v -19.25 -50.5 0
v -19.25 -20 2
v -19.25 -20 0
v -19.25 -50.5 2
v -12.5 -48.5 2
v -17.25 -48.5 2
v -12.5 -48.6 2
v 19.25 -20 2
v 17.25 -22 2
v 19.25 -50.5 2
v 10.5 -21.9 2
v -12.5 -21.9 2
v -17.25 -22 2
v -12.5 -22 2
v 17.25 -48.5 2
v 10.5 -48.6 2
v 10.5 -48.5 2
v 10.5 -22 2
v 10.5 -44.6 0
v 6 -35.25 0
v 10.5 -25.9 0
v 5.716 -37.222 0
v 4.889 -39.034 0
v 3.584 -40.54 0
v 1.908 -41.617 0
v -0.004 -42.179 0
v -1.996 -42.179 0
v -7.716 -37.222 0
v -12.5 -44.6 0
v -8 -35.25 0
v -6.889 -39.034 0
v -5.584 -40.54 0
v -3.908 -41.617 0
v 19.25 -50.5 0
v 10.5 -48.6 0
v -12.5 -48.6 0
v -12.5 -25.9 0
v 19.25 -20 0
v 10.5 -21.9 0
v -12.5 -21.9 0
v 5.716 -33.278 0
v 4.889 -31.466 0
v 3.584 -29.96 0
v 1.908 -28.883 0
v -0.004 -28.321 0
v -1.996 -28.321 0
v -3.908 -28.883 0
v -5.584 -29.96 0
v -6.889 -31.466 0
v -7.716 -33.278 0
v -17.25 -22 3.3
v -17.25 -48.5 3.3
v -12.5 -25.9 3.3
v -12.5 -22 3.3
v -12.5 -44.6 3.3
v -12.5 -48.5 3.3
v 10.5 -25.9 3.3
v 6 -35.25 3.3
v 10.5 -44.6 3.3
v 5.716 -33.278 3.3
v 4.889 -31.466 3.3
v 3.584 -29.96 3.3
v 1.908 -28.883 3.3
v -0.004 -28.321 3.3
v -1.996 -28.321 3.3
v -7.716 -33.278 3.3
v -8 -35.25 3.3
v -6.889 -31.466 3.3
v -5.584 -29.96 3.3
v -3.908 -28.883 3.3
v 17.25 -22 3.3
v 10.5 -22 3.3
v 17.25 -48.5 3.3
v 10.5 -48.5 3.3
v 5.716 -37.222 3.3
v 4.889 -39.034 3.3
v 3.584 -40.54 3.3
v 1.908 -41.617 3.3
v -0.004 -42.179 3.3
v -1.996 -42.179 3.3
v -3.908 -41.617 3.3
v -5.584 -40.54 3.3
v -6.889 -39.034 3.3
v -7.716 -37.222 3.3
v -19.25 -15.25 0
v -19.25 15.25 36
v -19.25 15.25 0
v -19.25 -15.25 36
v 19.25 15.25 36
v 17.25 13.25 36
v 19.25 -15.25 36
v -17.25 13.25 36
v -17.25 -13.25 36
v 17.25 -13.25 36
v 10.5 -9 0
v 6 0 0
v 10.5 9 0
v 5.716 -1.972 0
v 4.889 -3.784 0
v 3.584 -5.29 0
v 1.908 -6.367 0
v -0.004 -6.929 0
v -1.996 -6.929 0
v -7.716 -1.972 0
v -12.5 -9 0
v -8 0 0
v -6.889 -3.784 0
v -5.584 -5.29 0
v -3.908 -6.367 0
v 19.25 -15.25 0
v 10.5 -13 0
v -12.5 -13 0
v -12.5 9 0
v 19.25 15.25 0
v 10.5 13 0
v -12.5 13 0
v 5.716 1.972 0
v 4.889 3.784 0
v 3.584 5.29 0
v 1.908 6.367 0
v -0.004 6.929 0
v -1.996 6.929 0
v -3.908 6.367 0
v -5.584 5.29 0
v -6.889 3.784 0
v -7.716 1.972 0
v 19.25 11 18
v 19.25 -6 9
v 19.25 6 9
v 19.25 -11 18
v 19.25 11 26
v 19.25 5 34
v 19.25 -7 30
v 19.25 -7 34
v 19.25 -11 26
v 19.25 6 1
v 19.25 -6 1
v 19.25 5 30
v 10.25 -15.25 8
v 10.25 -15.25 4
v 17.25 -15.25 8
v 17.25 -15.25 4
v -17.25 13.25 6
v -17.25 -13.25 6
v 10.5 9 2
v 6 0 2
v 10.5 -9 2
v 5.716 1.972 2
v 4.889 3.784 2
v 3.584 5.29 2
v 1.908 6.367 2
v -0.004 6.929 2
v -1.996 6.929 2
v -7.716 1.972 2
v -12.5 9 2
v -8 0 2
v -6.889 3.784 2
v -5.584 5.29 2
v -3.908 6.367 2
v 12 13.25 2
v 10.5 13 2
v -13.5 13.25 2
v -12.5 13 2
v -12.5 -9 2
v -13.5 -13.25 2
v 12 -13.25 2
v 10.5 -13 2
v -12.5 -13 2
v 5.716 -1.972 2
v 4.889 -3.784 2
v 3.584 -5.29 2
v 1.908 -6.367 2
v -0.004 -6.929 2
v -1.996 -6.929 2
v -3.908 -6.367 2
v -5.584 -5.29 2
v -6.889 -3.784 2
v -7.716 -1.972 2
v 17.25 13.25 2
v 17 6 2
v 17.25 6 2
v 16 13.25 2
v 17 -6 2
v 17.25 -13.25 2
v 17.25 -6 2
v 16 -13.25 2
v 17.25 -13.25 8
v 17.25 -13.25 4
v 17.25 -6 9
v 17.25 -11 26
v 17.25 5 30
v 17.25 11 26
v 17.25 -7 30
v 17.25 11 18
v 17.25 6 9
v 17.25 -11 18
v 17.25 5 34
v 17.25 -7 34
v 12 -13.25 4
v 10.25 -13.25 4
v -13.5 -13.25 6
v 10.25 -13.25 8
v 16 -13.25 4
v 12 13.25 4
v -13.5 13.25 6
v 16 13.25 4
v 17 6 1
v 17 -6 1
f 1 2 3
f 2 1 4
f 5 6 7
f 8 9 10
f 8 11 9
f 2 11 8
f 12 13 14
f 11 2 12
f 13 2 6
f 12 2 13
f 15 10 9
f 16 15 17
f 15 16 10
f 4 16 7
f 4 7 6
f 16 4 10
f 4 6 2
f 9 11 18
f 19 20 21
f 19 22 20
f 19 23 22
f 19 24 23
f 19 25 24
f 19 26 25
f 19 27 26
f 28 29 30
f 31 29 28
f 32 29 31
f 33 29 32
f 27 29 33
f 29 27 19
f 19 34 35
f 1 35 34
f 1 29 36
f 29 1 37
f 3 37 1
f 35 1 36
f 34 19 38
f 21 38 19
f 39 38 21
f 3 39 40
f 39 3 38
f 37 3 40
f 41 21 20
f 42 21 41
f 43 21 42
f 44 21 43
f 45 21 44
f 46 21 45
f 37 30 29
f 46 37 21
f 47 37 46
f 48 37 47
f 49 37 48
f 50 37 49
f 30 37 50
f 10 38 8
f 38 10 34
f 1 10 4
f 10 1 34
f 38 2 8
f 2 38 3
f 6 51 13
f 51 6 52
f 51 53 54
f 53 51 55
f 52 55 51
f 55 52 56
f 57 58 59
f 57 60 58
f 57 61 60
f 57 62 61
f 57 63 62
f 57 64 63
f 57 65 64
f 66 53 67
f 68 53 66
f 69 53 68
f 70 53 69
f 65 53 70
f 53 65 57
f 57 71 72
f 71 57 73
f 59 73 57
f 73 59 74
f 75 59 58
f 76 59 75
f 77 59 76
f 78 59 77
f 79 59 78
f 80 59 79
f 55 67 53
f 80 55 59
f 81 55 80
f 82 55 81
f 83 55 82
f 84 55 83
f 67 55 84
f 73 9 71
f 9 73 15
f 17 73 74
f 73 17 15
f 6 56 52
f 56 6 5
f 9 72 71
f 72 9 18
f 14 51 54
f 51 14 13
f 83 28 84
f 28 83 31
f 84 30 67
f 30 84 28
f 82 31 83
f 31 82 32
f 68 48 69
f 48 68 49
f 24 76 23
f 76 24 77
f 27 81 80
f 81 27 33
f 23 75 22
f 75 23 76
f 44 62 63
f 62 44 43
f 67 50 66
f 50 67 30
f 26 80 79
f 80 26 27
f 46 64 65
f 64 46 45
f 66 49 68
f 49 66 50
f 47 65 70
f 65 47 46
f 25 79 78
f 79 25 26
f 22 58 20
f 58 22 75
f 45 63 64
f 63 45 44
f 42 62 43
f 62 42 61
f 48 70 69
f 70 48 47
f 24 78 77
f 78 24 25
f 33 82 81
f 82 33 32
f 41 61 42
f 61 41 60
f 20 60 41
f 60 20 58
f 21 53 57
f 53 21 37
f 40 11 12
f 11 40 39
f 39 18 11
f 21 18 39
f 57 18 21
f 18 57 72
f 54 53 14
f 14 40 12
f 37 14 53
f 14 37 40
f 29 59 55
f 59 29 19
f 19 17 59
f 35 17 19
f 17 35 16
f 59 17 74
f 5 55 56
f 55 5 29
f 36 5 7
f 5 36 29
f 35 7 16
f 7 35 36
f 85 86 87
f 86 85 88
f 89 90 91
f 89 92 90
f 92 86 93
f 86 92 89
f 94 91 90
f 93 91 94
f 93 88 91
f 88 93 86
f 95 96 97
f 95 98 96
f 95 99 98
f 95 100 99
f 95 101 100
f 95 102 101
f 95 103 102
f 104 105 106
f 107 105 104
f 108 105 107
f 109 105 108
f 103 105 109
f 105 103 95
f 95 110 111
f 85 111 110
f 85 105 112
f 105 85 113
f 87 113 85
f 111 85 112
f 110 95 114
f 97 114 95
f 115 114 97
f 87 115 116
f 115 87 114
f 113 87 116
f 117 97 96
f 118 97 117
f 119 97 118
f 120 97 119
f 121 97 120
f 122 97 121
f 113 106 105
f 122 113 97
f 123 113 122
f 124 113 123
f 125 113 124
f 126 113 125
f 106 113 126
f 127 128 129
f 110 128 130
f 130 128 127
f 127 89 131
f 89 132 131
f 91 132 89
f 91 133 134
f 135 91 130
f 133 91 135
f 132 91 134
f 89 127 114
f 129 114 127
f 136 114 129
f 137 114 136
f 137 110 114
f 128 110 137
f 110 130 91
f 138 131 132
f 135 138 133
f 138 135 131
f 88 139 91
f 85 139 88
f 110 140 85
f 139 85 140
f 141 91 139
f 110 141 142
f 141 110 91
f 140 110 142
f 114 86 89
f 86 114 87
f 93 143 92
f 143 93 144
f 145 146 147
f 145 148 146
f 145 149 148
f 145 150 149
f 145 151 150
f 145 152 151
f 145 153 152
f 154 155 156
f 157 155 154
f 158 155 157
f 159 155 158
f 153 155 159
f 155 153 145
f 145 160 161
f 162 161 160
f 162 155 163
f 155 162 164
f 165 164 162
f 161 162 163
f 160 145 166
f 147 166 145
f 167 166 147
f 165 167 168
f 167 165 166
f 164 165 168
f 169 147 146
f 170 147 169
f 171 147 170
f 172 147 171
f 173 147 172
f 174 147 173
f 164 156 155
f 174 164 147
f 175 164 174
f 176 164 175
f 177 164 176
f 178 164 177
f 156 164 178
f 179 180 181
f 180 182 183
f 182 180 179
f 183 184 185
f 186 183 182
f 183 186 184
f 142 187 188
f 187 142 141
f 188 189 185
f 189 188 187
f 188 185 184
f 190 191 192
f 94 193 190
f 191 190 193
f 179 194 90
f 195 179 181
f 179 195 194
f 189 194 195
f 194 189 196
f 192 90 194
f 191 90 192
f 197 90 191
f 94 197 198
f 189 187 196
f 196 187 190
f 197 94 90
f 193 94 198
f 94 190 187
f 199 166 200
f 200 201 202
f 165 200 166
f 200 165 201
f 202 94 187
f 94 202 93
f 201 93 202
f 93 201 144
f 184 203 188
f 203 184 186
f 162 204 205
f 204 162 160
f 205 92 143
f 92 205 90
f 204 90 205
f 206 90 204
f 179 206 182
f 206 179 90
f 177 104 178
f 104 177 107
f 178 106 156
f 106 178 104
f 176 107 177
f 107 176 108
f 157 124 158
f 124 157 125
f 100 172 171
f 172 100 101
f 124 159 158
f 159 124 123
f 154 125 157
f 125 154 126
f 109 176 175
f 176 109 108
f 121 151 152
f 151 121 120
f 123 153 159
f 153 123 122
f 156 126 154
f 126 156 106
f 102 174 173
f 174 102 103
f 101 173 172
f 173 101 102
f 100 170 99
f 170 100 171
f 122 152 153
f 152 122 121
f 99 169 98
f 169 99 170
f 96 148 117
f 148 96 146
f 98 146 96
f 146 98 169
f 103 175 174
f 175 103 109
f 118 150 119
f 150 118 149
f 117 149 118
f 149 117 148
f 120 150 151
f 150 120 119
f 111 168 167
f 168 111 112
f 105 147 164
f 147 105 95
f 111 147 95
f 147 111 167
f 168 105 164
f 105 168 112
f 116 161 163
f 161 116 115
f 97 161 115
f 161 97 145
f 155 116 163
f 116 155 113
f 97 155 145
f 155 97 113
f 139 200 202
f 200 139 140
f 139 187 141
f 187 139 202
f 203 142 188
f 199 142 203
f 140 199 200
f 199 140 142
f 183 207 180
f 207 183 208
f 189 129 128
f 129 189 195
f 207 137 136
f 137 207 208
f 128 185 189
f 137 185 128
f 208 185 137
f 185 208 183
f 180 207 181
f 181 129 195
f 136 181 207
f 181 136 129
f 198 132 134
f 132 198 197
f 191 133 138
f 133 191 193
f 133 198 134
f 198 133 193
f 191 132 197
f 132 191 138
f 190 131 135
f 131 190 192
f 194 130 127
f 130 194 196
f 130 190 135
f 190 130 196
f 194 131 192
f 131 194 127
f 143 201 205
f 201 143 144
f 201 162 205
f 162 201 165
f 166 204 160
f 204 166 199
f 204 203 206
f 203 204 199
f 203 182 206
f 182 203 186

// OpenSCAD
//
// WeMOS D1 Mini Stack Enclosure Script
//
// I wrote this script to generate a suitable 3-d printed enclosure for a WeMOS "stack" of shields.
// Since there are a variety of connectors, sizes and arrangements, I decided to let the customizer
// allow for various positionings of each shields port.
//
// To use, you will need to assemble your device and measure the total height of the case, and the
// height offsets for any shields that require an opening in the case.
//
// For instance, I have a WeMOS D1 Mini with a battery shield and then an SD Card shield on top of 
// that.  All have stackable headers, that have had their pins trimmed to make the stack as short
// as possible.  The resulting measurements of the stack yield the default values of this script.
//

/* [Height] */

// Final height of the stack walls.
height = 36.0;

/* [Shield Ports] */

// Distance from the bottom to the bottom of the usb connector opening (0.0 to omit)
usb_height = 1.0;
// Distance from the bottom to the bottom of the microsd shield opening (0.0 to omit)
microsd_height = 30;
// Distance from the bottom to the bottom of the battery shield connector opening (0.0 to omit)
battery_height = 18.0;
// Distance from the bottom to the bottom of the relay shield connector terminal opening (0.0 to omit)
relay_height = 0.0;

// ---------------------------------------------------------------------------------------------------------
// do not need to modify anything below here
// ---------------------------------------------------------------------------------------------------------
/* [Hidden] */

thickness = 2.0;
fudge = 0.1;

width = 38.5;
depth = 30.50;
 
cavity_width = width - (2 * thickness);
cavity_depth = depth - (2 * thickness);
cavity_height = height - thickness + fudge;

hole_diameter = 7.0;

slit_width = 4.0;
slit_height = 23.0;

// lid
rotate([0, 0, 180])
difference() {
    union () {
        translate([-(width / 2.0), 20, 0.0]) cube([width, depth, 2.0]);
        translate([-(cavity_width / 2.0), 22, 2.0]) cube([cavity_width, cavity_depth, 1.3]);            
    }
    translate([1, 22 + (cavity_depth / 2), 2.5]) cylinder(h = 5 + fudge, r1 = hole_diameter, r2 =hole_diameter, center = true);
    rotate([0, 0, 90]) translate([21.9, -12.5, 0]) cube([slit_width, slit_height, 10]);
    rotate([0, 0, 90]) translate([44.6, -12.5, 0]) cube([slit_width, slit_height, 10]);
}

// base
rotate([0, 0, 180])
union() {
    translate([13.5, -(cavity_depth / 2.0), 2]) cube([4.0, cavity_depth, 4.0]);
    translate([-16, -(cavity_depth / 2.0), 2]) cube([4.0, cavity_depth, 2.0]);
    difference () {
        translate([0, 0, height / 2.0]) cube([width, depth, height], center = true); 
        translate([0, 0, (cavity_height / 2.0) + thickness]) cube([cavity_width, cavity_depth, cavity_height], center = true);
        translate([1, 0, thickness / 2.0]) cylinder(h = thickness + fudge, r1 = hole_diameter, r2 = hole_diameter, center = true);
        rotate([0, 0, 90]) translate([9, -12.5, 0]) cube([slit_width, slit_height, 5]);
        rotate([0, 0, 90]) translate([-13, -12.5, 0]) cube([slit_width, slit_height, 5]);
        translate([-17.25, 13.0, 4]) cube([7, 3, 4]);        
        if (usb_height > 0.0)
        {
            translate([-20, -6, 1]) cube([3, 12, 8]);
        }
        if (microsd_height > 0.0)
        {
            translate([-20, -5, microsd_height]) cube([3, 12, 4]);
        }
        if (battery_height > 0.0)
        {
            translate([-20, -11, battery_height]) cube([3, 22, 8]);
        }
        if (relay_height > 0.0)
        {
            translate([-20, -6, relay_height]) cube([3, 15, 7]);
        }
    }
}
